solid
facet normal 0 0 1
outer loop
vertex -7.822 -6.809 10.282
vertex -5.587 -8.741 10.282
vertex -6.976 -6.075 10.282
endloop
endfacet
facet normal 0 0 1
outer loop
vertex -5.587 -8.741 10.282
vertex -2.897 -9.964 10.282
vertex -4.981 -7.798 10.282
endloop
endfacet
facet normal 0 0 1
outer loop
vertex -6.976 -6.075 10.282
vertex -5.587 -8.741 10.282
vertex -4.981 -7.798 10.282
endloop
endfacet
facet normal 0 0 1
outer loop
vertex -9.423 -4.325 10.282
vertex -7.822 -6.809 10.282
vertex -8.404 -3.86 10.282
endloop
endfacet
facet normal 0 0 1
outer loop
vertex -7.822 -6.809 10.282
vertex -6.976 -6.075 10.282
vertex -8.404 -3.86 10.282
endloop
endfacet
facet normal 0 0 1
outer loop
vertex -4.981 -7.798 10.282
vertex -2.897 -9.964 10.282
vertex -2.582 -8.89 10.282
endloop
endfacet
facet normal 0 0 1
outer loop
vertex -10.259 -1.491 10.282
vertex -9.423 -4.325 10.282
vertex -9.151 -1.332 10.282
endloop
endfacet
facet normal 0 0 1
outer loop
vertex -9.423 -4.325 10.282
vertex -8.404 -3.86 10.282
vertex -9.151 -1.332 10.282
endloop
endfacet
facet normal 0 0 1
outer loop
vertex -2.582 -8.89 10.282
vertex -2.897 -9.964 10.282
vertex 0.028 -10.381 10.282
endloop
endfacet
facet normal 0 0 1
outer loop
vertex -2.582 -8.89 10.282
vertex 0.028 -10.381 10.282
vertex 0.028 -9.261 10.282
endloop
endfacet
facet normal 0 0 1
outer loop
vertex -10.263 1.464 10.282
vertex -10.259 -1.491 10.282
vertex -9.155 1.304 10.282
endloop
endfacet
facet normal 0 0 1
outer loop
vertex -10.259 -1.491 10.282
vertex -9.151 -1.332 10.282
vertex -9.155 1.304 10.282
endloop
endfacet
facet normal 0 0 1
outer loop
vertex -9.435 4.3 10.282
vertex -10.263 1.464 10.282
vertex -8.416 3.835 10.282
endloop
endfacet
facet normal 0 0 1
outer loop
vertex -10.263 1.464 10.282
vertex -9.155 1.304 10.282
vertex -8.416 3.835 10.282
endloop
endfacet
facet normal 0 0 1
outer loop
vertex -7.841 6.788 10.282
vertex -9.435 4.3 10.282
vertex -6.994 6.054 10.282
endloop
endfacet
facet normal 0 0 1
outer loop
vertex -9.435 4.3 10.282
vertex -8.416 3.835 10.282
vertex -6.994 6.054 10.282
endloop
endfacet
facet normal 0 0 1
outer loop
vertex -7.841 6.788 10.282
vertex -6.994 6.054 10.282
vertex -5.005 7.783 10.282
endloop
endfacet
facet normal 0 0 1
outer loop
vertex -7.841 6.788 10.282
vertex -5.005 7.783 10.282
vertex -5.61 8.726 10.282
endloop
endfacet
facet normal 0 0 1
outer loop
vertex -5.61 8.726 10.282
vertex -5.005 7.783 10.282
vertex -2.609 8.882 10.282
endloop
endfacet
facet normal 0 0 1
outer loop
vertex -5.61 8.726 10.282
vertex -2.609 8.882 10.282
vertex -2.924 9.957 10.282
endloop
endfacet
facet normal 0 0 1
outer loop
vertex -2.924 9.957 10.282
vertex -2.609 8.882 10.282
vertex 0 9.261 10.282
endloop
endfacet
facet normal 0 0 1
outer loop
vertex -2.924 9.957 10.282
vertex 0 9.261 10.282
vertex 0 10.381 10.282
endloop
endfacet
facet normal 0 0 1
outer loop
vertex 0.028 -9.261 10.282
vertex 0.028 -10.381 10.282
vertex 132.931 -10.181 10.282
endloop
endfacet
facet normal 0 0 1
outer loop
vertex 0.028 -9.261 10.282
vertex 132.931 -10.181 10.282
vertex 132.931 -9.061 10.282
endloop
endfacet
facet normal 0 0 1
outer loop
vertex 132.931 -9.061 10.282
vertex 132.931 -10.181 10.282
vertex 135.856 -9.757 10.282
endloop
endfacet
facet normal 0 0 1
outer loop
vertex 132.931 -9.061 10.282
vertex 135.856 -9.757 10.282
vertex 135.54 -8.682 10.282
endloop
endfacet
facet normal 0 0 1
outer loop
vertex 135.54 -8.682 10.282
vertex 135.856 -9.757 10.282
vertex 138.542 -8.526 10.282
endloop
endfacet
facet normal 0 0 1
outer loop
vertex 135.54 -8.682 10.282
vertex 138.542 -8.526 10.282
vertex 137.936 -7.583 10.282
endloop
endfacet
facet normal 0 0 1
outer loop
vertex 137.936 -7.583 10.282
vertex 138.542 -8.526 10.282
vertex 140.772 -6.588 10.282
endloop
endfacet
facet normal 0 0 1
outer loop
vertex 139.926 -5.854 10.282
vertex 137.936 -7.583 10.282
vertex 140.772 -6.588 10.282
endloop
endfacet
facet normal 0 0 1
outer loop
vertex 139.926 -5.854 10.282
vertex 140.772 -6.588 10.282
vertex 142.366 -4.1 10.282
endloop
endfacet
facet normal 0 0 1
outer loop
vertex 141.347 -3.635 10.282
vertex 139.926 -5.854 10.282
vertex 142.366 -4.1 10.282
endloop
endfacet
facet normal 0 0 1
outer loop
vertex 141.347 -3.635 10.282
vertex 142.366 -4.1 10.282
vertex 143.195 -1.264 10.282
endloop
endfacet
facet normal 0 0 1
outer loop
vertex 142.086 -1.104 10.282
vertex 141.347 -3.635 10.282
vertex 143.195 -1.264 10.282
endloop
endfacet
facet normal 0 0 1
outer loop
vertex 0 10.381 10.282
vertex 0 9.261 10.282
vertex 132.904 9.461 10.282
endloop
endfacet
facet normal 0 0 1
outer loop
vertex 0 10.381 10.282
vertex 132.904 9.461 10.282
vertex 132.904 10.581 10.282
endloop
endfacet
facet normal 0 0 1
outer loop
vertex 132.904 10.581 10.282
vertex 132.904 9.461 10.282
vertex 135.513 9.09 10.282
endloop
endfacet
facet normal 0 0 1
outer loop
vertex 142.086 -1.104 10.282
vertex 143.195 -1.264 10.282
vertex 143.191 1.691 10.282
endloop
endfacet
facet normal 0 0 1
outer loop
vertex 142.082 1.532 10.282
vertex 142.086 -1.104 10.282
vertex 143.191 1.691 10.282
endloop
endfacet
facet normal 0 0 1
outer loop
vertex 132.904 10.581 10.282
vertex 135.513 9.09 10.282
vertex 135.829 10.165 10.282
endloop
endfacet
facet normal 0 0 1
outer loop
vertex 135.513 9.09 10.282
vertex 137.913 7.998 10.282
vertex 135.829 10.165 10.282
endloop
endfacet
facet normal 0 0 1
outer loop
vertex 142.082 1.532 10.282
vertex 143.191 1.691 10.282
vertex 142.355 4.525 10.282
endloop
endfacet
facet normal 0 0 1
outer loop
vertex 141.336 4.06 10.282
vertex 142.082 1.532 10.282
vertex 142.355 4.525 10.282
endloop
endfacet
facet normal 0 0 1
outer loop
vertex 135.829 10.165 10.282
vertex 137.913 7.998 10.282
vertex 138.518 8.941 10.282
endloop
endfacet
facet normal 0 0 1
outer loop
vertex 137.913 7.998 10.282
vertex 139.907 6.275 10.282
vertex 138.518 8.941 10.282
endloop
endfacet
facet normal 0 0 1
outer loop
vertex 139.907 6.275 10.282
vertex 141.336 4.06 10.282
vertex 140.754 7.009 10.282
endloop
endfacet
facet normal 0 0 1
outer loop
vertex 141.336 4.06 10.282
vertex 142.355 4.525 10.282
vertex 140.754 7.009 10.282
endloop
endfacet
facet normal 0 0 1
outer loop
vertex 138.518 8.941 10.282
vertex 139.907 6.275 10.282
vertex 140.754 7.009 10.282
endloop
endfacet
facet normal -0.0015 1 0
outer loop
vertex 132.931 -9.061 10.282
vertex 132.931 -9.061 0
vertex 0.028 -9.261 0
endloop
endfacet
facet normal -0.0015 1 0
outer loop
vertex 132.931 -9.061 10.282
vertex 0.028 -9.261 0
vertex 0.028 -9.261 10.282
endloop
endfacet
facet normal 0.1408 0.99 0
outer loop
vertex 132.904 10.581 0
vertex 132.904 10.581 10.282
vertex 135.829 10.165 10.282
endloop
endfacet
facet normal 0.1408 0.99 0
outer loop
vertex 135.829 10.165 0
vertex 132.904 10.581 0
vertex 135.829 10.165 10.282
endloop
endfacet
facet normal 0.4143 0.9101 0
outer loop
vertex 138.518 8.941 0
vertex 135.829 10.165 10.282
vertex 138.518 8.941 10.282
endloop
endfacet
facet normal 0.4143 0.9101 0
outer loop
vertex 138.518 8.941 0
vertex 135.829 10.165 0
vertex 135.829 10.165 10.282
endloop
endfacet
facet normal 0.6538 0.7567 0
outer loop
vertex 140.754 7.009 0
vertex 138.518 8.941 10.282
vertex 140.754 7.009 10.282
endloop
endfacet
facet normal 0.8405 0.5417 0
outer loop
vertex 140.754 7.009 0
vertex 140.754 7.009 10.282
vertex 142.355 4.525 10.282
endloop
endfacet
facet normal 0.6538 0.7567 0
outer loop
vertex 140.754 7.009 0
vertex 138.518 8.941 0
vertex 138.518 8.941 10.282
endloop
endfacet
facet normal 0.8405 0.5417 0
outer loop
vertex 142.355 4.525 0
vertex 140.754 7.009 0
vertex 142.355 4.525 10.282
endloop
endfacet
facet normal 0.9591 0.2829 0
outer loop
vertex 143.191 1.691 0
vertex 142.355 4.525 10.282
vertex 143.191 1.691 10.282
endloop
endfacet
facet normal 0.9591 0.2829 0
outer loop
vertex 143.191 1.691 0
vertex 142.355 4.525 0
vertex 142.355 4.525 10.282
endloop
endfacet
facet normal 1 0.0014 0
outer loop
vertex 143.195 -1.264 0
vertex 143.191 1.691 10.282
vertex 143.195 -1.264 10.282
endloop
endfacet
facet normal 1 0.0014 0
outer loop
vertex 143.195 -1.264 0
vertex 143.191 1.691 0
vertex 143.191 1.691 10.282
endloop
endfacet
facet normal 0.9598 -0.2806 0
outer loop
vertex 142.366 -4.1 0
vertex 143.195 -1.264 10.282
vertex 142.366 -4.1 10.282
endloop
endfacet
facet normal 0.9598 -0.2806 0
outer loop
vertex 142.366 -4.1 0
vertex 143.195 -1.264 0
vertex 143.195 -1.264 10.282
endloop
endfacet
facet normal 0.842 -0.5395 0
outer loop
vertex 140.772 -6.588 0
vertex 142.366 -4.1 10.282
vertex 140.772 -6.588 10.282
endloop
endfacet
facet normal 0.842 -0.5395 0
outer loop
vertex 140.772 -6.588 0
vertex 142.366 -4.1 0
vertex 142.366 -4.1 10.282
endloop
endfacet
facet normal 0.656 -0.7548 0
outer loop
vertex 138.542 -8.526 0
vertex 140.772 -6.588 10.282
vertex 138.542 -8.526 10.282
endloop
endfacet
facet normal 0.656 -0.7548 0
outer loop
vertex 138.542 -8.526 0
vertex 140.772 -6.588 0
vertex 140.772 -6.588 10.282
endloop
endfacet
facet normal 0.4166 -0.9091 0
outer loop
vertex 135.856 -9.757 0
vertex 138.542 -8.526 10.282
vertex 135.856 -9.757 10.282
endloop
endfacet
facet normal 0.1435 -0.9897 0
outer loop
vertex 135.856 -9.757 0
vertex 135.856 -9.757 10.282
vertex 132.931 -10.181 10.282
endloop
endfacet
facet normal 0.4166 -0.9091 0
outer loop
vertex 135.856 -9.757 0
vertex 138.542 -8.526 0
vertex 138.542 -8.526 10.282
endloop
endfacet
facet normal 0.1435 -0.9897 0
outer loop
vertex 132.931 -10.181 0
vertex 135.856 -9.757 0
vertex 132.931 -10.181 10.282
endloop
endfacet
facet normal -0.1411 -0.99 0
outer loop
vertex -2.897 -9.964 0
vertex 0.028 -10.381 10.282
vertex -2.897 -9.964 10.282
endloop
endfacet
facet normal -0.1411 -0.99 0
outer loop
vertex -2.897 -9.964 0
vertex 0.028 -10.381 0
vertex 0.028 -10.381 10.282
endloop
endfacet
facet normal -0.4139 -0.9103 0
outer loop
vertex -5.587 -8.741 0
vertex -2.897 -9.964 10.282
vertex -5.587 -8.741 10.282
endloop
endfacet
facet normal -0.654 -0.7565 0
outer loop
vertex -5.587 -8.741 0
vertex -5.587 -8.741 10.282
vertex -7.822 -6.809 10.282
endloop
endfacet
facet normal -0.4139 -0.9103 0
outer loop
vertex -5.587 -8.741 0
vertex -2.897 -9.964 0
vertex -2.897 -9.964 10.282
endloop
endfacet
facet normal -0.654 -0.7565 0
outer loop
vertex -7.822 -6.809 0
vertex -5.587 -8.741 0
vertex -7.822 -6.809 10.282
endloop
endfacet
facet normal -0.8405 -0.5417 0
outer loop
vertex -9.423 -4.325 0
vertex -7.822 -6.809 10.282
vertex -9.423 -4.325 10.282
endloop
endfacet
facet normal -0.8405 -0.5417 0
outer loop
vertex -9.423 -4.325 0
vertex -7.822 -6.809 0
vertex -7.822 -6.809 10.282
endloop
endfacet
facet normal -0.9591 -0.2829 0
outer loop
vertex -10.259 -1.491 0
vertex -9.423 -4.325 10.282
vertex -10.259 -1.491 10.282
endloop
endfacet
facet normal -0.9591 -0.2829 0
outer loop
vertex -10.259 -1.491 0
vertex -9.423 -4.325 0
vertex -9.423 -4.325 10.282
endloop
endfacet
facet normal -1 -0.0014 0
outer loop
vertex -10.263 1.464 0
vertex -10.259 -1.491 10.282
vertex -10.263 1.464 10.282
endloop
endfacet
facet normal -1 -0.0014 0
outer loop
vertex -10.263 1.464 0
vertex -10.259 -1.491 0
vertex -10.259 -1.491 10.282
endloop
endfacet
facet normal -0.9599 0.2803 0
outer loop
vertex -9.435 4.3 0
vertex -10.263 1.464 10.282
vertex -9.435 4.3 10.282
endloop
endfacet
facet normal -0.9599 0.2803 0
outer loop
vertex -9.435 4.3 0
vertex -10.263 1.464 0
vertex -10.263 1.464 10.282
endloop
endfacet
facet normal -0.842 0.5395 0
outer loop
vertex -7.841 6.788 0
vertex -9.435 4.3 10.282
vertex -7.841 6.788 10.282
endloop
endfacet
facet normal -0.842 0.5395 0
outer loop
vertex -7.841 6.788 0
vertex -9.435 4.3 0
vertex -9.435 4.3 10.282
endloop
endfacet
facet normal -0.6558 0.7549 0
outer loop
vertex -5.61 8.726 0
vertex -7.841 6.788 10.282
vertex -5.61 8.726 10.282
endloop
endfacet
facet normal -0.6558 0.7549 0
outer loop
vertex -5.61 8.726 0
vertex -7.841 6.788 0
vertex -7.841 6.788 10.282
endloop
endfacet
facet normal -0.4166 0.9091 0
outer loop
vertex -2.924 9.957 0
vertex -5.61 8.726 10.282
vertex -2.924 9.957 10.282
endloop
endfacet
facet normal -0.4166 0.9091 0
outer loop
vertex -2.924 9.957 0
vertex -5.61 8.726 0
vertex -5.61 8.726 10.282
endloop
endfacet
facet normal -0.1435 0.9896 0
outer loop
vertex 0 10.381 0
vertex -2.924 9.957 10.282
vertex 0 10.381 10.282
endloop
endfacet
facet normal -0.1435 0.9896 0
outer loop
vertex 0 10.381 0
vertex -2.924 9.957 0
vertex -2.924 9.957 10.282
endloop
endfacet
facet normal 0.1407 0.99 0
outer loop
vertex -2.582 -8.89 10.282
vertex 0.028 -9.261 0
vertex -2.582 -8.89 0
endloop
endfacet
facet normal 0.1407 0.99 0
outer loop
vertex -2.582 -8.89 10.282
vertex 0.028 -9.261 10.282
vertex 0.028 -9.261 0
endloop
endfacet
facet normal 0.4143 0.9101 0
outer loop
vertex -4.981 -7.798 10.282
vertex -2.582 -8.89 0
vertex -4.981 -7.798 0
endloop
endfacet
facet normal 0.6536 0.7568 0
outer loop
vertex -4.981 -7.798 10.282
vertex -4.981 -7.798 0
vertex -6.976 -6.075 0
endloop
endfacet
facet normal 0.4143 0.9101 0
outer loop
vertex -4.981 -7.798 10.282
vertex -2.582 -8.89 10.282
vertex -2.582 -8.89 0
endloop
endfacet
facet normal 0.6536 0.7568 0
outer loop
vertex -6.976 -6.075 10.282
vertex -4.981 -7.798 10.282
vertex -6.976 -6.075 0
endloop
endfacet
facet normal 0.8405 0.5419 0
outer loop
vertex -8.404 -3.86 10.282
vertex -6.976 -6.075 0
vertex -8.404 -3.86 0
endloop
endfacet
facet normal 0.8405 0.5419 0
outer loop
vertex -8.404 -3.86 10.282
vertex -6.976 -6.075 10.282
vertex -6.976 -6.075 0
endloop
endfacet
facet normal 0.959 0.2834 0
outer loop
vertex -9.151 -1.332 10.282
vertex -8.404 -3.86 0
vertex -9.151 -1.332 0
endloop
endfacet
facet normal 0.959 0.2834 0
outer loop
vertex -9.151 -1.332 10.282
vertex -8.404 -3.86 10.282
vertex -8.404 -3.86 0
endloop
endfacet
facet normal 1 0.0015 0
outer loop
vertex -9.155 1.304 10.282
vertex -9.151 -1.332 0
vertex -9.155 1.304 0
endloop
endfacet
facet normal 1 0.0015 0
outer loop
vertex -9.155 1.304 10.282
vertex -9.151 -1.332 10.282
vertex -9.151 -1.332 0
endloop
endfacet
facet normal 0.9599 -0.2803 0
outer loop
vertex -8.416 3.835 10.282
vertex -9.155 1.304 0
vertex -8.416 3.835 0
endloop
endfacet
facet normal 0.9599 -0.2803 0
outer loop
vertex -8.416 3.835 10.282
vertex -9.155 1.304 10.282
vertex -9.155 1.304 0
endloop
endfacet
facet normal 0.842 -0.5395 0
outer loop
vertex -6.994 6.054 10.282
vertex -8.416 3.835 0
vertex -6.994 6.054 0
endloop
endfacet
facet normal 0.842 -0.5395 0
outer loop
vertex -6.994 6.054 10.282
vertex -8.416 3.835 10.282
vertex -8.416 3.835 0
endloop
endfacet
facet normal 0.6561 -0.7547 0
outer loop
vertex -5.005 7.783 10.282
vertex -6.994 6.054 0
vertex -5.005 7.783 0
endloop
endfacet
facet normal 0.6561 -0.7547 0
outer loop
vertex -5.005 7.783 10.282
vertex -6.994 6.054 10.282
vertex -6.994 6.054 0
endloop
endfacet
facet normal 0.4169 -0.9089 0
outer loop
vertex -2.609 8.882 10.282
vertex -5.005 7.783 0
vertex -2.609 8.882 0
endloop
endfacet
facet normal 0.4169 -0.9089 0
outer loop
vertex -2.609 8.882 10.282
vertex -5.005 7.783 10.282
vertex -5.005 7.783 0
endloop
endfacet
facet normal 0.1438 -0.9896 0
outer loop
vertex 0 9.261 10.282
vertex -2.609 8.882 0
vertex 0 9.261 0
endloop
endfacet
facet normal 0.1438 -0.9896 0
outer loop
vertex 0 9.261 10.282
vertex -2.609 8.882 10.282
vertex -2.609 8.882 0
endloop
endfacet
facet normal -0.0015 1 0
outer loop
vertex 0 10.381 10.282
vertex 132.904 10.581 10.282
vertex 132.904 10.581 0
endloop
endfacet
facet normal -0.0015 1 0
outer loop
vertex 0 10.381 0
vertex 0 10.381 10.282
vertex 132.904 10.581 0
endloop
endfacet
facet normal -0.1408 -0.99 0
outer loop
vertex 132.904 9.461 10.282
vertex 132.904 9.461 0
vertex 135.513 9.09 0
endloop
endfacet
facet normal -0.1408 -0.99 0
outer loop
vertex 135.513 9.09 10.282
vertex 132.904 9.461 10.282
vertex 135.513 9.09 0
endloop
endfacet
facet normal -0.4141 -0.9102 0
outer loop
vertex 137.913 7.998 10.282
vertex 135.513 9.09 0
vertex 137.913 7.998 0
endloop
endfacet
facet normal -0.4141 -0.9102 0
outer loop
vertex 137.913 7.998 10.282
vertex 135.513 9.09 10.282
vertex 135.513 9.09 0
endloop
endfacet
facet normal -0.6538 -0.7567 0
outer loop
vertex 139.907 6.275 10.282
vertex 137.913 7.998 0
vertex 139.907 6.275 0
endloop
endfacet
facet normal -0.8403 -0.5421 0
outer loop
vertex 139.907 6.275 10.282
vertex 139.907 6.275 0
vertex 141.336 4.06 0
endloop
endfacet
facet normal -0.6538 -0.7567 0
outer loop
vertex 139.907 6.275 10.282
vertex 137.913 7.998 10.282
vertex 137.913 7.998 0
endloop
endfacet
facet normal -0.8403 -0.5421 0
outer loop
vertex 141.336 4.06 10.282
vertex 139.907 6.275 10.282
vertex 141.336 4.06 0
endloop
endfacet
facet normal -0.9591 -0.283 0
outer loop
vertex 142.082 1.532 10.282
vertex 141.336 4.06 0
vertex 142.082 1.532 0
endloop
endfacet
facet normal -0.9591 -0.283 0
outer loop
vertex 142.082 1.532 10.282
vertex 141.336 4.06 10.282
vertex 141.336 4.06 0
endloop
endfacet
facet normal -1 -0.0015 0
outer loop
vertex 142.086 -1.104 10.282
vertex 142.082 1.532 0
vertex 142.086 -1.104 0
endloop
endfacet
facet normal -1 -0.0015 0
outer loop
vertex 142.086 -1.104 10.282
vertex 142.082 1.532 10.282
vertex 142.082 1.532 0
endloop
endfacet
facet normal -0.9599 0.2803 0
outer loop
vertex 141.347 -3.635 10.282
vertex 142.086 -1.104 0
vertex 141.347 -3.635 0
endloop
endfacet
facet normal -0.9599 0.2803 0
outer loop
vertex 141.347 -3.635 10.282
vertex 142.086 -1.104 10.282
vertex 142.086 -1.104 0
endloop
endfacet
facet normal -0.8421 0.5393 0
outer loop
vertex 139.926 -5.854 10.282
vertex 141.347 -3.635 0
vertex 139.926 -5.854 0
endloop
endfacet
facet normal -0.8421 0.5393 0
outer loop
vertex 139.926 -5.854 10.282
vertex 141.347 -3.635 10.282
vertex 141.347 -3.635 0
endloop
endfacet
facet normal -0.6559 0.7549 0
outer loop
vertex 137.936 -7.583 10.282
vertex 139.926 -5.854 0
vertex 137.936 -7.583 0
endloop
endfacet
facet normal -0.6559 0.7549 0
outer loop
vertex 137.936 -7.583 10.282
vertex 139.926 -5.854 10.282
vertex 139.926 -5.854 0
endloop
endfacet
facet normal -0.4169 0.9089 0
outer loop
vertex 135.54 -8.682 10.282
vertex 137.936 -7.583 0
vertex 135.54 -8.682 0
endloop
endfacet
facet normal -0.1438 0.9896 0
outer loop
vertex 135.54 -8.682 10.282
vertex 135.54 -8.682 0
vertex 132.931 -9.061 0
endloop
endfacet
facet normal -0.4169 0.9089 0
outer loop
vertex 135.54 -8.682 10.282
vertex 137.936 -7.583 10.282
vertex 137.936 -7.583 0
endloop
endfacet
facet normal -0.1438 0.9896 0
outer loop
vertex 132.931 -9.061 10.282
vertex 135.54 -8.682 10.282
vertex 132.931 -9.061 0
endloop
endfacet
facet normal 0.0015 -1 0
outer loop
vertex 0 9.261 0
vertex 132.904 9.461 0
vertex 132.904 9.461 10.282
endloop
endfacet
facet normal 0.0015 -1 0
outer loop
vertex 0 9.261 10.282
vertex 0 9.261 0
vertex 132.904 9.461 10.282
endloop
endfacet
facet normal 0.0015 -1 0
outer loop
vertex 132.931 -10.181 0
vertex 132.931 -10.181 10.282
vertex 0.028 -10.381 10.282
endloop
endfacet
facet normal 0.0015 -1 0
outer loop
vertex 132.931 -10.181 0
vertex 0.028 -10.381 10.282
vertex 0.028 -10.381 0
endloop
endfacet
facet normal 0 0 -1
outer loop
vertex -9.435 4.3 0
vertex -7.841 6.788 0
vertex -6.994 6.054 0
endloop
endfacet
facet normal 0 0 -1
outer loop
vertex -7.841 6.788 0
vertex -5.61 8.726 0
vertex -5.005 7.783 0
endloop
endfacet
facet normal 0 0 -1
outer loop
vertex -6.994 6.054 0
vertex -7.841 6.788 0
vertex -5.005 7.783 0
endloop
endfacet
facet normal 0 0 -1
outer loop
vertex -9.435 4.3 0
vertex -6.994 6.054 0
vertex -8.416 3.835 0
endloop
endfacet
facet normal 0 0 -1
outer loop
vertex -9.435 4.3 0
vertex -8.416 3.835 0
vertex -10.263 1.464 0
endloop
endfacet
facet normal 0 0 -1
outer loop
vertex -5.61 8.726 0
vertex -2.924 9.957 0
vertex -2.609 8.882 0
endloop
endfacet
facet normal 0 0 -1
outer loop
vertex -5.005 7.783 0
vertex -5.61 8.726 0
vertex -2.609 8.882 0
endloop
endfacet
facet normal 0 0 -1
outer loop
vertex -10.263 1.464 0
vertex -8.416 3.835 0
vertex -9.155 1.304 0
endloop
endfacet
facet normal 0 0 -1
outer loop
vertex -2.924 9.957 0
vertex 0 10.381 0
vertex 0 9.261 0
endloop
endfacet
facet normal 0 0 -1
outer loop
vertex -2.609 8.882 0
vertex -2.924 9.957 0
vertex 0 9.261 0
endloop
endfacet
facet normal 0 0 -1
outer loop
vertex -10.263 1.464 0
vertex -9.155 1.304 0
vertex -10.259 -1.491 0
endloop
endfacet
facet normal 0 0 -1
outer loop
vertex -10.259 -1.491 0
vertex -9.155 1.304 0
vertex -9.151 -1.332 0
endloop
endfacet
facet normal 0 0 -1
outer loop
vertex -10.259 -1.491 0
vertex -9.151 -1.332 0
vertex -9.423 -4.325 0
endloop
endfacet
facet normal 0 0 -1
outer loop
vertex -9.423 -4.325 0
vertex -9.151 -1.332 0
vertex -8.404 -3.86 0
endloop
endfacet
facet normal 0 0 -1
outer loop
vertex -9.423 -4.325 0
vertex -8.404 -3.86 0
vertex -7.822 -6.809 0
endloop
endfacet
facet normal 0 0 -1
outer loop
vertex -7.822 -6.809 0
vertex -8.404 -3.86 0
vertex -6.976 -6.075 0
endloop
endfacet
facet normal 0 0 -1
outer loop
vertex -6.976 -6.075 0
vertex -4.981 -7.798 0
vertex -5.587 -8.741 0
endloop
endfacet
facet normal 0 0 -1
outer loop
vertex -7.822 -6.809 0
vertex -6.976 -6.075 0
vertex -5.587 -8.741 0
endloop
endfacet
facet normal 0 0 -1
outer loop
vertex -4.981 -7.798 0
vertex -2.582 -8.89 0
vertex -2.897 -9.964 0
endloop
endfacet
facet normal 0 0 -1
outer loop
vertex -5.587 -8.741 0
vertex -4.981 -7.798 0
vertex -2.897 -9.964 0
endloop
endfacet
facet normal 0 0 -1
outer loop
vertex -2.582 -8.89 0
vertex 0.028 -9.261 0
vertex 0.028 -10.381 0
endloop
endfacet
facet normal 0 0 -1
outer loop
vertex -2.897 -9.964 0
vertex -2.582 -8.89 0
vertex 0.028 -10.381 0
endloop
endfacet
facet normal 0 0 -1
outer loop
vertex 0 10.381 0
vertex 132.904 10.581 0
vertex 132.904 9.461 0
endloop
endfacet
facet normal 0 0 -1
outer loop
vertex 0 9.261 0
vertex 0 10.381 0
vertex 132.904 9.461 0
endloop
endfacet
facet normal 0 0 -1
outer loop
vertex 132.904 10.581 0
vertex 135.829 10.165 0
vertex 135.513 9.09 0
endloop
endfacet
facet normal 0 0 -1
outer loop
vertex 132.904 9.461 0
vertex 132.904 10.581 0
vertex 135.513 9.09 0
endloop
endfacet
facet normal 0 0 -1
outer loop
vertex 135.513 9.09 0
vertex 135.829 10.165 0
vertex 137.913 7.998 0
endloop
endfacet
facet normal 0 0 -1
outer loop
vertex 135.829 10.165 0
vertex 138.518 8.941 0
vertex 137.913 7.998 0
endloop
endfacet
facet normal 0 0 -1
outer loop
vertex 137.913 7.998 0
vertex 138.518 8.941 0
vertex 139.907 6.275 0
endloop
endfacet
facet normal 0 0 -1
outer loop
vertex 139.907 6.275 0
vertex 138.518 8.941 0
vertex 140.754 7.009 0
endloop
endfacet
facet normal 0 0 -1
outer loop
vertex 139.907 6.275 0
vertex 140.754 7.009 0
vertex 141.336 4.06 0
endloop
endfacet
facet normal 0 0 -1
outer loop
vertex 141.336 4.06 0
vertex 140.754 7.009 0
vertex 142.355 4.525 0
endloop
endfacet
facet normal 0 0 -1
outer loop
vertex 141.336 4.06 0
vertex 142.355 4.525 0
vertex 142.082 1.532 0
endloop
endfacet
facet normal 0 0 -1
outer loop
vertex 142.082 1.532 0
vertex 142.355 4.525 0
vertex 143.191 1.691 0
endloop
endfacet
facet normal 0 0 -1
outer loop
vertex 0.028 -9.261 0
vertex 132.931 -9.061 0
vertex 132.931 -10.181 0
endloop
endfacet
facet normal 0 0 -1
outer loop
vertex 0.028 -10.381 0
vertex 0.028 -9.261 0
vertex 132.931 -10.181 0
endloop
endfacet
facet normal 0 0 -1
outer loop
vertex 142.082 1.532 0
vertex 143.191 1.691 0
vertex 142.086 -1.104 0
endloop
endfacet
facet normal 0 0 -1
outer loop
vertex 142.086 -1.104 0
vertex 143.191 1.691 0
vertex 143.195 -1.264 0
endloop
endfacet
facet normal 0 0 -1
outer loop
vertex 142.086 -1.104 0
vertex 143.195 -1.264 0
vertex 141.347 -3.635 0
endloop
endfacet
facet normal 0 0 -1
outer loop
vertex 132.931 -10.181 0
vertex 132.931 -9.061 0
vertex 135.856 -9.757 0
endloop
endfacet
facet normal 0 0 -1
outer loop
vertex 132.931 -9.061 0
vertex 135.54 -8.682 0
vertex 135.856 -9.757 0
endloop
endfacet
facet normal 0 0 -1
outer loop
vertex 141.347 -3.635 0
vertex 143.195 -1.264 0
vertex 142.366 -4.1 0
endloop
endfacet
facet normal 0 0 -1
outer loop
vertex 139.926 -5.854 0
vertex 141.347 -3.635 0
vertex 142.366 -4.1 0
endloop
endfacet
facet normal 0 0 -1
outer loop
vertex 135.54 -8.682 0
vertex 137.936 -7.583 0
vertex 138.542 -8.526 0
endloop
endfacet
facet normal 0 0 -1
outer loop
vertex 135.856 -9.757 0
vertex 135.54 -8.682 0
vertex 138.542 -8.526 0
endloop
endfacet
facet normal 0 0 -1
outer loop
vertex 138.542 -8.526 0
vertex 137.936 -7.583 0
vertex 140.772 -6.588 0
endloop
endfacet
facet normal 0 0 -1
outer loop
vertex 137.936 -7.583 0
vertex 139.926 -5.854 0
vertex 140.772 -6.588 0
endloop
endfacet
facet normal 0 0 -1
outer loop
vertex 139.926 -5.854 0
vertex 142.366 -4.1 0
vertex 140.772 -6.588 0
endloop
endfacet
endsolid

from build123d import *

# Parameters (mm, degrees)
SKETCH4_W = 10.28192
SKETCH4_H = 1.12


with BuildPart() as part:
    # Sweep1: sweep along a path in Sketch1
    with BuildLine(Plane.XY) as sweep1_path:
        Line((-2.41e-07, 9.261094), (132.90351643, 9.461083519))
        ThreePointArc((132.90351643, 9.461083519), (142.178535768, 0.213935094), (132.931386612, -9.061083513))
        Line((132.931386612, -9.061083513), (0.027869908, -9.261052065))
        ThreePointArc((0.027869908, -9.261052065), (-9.247137468, -0.013914106), (-2.41e-07, 9.261094))
    # Sketch4 → Sweep1 (sweep)
    with BuildSketch(Plane.ZY):
        with Locations((5.14096, 9.821094)):
            Rectangle(SKETCH4_W, SKETCH4_H)
    sweep(path=sweep1_path.line)


solid = part.part
